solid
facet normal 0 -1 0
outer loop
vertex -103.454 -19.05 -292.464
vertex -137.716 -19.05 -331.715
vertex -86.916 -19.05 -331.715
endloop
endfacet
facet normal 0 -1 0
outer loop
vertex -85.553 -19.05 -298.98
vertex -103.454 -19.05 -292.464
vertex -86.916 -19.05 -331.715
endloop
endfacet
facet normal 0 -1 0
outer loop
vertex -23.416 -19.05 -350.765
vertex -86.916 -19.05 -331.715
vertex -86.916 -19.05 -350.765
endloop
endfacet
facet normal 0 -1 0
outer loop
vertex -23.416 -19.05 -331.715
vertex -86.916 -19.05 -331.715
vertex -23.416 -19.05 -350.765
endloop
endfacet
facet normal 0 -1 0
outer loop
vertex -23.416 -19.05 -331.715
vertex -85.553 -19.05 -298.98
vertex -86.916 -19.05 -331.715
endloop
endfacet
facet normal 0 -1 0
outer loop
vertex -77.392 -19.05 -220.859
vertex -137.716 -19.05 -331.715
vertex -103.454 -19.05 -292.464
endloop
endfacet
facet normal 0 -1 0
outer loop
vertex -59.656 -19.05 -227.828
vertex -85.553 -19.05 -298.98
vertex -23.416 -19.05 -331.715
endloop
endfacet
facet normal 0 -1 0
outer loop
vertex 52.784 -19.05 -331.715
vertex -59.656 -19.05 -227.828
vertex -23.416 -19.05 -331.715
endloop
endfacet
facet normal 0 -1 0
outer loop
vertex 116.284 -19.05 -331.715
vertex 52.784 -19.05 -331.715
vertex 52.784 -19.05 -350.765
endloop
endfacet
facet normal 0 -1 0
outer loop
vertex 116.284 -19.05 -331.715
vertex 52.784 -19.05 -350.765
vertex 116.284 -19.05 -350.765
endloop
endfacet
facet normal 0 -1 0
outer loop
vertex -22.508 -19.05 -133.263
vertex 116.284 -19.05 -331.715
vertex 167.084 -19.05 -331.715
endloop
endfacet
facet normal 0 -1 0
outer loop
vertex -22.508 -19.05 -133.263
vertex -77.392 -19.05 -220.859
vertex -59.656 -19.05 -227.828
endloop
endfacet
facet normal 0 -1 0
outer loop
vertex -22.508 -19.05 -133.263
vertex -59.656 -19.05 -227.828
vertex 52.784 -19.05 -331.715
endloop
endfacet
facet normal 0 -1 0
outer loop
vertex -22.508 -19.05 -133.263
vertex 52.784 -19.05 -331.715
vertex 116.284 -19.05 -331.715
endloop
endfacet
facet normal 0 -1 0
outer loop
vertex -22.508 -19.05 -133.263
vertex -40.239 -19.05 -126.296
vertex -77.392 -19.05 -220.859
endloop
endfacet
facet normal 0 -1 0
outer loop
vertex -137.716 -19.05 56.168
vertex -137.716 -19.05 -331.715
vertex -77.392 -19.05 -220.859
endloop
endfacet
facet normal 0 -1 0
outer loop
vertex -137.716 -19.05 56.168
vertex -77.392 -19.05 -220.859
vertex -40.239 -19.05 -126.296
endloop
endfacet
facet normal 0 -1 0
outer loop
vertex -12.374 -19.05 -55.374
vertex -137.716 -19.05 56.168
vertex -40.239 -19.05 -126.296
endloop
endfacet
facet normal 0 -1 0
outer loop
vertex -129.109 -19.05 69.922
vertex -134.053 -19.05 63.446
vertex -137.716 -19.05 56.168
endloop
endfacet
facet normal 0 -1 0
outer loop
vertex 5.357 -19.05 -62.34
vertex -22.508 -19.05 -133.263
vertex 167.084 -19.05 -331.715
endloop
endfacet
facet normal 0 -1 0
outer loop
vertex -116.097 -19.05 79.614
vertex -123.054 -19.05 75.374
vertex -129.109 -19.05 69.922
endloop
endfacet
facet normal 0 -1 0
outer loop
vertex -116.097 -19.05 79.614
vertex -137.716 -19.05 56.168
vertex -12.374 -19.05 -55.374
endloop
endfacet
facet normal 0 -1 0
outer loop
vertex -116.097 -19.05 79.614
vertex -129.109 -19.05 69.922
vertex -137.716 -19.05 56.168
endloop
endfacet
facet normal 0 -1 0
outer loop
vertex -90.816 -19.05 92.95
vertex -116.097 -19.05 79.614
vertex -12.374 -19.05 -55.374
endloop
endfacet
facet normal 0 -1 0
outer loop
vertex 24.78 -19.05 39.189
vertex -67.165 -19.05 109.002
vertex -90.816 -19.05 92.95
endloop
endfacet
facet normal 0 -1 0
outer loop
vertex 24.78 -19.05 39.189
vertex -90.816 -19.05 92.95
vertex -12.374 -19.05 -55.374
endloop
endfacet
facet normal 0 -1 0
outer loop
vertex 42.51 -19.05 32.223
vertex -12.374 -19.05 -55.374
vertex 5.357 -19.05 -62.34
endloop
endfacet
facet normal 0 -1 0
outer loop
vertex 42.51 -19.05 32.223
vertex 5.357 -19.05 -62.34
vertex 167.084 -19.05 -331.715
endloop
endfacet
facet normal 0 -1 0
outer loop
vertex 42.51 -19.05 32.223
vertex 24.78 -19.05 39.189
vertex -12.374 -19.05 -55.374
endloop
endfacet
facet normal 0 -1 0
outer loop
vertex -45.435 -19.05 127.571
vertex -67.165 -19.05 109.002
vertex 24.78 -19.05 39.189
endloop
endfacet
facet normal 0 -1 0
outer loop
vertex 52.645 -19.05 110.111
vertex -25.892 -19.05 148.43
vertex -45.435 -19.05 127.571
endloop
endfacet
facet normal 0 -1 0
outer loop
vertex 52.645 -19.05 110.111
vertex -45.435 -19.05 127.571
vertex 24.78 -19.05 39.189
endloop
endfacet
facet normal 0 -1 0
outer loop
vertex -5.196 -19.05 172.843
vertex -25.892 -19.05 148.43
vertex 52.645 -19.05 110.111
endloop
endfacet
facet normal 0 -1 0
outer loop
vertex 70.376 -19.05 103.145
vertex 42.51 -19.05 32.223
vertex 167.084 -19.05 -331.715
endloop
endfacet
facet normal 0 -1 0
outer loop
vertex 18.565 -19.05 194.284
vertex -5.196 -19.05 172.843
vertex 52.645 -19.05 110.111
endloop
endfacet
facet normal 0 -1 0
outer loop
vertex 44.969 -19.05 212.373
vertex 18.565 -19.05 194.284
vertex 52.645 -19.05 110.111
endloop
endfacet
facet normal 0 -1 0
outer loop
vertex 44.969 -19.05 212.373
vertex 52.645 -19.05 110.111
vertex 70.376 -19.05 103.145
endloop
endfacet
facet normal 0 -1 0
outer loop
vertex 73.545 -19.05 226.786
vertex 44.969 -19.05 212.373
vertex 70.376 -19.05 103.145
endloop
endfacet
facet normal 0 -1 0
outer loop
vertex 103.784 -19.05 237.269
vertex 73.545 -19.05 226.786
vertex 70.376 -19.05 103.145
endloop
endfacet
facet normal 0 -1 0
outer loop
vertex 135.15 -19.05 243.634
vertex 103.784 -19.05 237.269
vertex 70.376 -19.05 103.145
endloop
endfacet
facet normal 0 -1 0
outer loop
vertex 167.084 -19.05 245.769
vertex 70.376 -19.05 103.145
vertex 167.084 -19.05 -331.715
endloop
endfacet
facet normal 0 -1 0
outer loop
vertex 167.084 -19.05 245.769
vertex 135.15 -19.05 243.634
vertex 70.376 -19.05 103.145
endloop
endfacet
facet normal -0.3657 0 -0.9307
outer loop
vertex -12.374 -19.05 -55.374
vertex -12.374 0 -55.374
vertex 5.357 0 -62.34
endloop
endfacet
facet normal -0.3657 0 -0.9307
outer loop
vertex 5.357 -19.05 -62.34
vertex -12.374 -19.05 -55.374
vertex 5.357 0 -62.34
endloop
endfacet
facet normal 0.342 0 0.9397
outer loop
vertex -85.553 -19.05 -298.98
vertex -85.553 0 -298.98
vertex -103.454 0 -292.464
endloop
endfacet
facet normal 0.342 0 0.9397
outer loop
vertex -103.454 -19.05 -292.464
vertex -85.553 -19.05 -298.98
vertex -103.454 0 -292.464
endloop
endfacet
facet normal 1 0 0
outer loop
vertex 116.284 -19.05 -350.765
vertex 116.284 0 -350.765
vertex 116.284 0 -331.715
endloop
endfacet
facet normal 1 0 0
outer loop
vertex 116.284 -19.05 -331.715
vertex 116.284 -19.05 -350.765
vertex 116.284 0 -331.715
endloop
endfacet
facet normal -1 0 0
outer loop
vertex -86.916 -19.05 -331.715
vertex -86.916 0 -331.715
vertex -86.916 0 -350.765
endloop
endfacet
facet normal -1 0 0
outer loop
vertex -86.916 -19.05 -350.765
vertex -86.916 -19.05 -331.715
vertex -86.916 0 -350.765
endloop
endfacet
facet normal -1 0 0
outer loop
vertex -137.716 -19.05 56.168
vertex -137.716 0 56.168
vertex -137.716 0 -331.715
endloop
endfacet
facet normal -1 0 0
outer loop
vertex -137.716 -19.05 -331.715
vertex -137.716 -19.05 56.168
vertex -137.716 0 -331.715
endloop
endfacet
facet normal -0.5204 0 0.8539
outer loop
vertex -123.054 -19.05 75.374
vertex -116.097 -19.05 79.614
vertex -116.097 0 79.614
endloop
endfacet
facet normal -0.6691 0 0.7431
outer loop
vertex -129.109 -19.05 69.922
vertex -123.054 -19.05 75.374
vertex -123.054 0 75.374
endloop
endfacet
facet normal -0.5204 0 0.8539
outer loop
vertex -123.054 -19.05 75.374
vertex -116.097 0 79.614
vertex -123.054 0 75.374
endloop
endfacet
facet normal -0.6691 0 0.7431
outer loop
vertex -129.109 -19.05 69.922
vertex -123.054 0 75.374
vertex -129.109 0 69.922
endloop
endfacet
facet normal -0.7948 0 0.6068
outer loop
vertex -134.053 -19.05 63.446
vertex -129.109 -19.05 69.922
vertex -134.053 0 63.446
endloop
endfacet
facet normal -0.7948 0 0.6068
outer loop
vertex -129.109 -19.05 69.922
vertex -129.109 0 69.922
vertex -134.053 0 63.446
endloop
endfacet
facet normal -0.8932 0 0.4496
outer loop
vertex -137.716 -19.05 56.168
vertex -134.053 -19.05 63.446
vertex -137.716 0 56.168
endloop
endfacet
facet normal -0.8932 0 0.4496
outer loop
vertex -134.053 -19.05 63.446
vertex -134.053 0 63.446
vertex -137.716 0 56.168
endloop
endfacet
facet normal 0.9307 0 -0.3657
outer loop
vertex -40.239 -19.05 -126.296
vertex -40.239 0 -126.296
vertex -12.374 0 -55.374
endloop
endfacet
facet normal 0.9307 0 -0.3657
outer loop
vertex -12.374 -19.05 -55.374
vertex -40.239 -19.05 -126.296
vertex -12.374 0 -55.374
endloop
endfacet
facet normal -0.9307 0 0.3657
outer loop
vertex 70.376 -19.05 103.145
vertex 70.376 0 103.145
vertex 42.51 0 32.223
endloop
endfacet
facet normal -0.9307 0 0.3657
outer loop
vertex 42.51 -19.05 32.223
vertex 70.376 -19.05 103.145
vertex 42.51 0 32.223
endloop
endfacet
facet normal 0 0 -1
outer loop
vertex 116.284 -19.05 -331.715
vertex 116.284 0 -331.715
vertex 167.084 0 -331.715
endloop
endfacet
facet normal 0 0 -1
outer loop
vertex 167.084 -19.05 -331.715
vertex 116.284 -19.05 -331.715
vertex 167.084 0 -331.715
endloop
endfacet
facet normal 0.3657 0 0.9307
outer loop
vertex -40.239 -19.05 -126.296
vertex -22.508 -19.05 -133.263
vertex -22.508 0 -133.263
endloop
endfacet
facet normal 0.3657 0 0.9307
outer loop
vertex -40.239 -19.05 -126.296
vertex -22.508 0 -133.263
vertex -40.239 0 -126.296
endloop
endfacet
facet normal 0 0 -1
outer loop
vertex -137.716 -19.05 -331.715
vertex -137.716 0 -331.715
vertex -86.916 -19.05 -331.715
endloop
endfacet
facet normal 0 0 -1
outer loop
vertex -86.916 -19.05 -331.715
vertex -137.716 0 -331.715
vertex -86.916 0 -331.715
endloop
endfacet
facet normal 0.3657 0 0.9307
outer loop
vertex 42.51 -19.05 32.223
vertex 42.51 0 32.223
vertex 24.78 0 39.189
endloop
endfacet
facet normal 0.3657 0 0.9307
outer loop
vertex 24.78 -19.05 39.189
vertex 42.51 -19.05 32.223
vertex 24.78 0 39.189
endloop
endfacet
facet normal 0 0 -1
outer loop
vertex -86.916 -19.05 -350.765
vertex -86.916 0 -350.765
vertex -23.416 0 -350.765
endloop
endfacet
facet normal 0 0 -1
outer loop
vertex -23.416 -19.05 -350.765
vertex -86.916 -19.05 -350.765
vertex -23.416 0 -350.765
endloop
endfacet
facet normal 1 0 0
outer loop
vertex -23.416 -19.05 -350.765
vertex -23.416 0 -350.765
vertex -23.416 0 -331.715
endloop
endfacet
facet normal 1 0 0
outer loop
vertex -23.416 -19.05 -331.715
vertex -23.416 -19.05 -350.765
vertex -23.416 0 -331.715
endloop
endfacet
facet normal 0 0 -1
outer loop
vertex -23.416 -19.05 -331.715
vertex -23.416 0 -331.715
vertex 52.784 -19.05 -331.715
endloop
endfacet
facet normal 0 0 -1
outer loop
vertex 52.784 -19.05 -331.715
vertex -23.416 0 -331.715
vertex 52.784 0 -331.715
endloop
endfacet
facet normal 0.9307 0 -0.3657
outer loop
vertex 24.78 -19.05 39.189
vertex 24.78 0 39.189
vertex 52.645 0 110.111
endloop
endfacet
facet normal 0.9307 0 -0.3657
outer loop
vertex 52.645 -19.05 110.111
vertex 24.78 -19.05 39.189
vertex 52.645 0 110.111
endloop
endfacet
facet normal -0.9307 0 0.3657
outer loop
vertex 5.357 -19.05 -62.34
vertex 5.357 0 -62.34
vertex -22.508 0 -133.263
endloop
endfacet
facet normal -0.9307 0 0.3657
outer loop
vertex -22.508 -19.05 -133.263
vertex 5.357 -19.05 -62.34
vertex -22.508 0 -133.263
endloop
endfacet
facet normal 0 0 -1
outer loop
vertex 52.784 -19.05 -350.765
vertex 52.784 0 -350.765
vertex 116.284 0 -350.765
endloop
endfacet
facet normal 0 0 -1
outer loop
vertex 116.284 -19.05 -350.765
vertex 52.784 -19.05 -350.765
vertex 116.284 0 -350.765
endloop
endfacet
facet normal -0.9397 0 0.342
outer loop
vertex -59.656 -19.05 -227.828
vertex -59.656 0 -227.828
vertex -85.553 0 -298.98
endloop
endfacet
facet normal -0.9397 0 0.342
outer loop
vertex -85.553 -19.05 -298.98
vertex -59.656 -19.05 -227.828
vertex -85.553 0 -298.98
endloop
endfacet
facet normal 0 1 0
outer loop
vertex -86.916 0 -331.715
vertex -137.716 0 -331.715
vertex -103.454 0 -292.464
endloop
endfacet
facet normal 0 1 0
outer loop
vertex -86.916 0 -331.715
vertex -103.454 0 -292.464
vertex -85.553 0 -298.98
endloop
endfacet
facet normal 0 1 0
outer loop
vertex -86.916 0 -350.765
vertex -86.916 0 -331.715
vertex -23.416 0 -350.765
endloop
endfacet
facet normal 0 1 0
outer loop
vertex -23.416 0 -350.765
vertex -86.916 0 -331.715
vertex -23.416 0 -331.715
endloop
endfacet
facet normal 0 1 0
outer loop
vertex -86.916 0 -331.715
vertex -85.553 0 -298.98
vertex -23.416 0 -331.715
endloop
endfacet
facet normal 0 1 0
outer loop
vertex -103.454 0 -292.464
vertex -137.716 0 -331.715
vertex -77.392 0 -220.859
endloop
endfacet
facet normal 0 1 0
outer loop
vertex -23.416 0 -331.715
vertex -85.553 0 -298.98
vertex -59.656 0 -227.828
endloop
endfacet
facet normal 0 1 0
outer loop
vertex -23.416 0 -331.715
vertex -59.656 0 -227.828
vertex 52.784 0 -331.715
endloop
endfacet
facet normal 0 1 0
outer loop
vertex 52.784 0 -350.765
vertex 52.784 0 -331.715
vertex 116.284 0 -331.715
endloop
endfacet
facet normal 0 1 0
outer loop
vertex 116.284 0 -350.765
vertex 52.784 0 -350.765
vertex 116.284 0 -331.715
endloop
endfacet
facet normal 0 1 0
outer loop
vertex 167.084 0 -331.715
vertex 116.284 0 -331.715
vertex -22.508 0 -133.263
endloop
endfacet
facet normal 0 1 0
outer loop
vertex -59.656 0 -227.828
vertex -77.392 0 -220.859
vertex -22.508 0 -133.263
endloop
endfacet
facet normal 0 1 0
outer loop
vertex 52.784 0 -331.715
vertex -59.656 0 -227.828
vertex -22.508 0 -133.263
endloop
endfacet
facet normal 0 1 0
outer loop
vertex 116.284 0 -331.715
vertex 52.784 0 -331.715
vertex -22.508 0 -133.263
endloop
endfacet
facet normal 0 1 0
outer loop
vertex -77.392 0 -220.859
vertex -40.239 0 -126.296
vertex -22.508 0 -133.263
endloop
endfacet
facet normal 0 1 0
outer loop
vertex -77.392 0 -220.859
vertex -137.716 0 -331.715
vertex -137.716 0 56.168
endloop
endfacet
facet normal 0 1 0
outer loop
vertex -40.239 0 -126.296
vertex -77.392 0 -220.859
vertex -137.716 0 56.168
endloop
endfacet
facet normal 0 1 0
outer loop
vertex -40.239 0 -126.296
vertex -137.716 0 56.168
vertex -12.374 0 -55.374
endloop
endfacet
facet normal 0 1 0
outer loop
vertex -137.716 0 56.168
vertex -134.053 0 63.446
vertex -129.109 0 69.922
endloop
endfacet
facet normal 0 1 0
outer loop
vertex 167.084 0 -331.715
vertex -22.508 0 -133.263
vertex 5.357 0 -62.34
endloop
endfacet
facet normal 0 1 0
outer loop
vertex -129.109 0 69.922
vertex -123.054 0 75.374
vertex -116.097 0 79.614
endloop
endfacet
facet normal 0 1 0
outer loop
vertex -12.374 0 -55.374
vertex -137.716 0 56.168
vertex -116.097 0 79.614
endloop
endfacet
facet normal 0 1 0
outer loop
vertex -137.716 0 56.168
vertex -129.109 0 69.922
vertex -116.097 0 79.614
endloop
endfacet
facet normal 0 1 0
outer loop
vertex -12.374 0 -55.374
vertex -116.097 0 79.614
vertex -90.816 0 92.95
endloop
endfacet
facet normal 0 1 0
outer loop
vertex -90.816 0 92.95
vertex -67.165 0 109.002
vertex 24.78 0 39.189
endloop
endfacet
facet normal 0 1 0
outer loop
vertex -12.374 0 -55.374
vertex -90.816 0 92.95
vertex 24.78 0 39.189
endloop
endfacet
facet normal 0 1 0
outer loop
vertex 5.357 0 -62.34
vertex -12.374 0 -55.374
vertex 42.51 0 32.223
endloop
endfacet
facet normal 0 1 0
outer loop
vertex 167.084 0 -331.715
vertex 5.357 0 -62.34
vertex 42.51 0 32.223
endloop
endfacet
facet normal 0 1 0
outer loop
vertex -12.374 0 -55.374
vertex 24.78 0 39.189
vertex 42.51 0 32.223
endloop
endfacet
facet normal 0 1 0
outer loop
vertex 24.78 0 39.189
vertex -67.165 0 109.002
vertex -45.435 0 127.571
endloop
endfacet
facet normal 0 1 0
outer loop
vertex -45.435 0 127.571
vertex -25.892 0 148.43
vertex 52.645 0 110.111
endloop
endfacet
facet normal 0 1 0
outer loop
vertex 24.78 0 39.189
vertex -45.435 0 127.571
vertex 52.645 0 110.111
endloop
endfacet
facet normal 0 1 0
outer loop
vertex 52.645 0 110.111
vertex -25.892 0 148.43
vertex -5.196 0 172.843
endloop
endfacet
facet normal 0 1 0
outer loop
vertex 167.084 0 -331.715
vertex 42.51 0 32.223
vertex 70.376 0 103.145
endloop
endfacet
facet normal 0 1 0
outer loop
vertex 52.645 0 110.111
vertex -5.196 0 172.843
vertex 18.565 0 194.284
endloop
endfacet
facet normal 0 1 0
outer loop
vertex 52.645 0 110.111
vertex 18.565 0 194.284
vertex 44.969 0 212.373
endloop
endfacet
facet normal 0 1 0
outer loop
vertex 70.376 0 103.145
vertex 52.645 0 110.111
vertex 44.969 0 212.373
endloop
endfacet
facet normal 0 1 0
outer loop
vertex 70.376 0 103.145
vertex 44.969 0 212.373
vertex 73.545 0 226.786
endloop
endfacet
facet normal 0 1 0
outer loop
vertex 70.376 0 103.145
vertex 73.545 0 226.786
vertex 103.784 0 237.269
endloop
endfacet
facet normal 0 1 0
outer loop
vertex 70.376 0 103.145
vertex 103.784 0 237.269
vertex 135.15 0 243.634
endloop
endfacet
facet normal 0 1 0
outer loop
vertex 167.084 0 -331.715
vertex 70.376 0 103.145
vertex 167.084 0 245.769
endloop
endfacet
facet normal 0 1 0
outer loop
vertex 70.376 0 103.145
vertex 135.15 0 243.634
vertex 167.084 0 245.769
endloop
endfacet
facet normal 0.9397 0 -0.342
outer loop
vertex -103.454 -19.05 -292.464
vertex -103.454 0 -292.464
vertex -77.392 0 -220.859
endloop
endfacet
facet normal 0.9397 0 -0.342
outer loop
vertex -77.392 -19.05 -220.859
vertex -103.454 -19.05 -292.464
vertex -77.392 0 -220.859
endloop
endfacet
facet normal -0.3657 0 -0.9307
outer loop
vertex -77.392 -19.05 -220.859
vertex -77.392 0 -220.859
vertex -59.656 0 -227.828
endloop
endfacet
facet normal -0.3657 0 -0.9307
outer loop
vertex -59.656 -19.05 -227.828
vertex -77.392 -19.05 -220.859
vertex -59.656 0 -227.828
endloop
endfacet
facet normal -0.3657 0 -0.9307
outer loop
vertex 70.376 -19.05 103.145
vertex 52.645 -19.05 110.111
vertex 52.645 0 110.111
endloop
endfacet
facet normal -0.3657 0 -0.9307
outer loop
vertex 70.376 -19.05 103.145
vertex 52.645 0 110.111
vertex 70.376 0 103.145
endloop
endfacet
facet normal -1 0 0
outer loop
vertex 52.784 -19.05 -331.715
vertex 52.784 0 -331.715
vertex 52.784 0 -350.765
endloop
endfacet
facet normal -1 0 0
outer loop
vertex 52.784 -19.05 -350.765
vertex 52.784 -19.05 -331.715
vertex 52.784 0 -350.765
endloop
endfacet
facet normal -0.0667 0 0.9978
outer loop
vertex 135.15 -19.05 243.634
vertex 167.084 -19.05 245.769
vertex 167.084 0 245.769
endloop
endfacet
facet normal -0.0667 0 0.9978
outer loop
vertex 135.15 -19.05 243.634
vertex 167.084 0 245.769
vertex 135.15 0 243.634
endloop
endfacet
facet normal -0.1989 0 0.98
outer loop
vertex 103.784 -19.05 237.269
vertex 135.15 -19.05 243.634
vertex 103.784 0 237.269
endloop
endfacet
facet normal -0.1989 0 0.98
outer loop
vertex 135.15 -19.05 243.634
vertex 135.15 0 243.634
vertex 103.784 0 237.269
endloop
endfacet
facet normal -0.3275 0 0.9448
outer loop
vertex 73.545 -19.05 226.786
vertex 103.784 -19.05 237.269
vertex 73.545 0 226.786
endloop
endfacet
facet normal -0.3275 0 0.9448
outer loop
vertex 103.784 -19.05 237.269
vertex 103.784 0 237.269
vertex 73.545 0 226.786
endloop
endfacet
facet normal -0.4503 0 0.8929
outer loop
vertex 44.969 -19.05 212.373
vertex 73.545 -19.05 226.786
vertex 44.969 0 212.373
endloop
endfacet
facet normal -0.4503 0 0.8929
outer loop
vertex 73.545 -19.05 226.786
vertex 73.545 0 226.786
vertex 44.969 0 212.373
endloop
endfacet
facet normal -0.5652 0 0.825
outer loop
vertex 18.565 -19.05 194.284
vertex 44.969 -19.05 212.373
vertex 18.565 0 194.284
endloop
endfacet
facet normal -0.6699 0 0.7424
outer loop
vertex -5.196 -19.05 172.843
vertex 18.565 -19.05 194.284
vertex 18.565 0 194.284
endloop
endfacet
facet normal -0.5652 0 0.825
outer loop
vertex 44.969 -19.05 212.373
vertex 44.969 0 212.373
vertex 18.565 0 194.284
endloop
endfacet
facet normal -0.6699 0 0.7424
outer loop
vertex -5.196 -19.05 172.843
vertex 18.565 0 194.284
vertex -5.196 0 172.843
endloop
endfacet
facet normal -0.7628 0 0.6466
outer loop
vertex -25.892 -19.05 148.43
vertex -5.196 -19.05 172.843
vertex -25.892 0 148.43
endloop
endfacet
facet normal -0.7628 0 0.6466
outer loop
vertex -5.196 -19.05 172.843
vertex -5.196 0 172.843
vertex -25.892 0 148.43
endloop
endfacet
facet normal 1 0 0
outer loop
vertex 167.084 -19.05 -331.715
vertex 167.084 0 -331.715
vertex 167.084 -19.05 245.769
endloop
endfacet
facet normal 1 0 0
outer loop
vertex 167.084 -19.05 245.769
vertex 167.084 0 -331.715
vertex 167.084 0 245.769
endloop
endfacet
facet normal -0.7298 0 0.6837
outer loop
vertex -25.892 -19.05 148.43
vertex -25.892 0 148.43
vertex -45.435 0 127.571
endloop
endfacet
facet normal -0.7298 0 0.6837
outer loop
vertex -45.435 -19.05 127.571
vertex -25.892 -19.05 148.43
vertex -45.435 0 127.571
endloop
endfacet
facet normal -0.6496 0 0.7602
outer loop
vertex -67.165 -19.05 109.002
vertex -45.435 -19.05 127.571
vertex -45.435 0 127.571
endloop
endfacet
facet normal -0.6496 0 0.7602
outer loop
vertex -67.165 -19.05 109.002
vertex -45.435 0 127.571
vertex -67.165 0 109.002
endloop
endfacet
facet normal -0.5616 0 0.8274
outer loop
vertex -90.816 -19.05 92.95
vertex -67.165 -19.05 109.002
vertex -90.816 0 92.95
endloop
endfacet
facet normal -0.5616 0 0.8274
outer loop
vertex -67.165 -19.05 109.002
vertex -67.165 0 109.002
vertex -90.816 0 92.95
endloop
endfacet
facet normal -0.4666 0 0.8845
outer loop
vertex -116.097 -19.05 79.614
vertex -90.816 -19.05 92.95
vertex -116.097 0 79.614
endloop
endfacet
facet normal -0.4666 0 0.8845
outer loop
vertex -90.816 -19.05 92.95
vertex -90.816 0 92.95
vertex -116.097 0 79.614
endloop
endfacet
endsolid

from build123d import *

# Parameters (mm, degrees)
F1_DEPTH = 19.05


with BuildPart() as f1:
    # F0 (on Front) → F1 (new body)
    with BuildSketch(Plane.XZ):
        with BuildLine():
            Line((-137.715965, -183.12481), (-137.715965, -331.7148))
            Line((-137.715965, -331.7148), (-86.915965, -331.7148))
            Line((-86.915965, -331.7148), (-86.915965, -350.7648))
            Line((-86.915965, -350.7648), (-23.415965, -350.7648))
            Line((-23.415965, -350.7648), (-23.415965, -331.7148))
            Line((-23.415965, -331.7148), (52.784035, -331.7148))
            Line((52.784035, -331.7148), (52.784035, -350.7648))
            Line((52.784035, -350.7648), (116.284035, -350.7648))
            Line((116.284035, -350.7648), (116.284035, -331.7148))
            Line((116.284035, -331.7148), (167.084035, -331.7148))
            Line((167.084035, -331.7148), (167.084035, 245.768648))
            ThreePointArc((167.084035, 245.768648), (59.016129, 220.056395), (-25.892278, 148.4299))
            ThreePointArc((-25.892278, 148.4299), (-67.164643, 109.001513), (-116.097022, 79.613962))
            ThreePointArc((-116.097022, 79.613962), (-129.108758, 69.921843), (-137.715965, 56.168355))
            Line((-137.715965, 56.168355), (-137.715965, -183.12481))
        make_face()
        Polygon((-85.55314, -298.979528), (-103.454284, -292.464044), (-77.392349, -220.859466), (-59.656096, -227.827985), align=None, mode=Mode.SUBTRACT)
        Polygon((-22.508237, -133.262681), (-40.238813, -126.296393), (-12.373661, -55.374088), (5.356915, -62.340376), align=None, mode=Mode.SUBTRACT)
        Polygon((42.510451, 32.222697), (24.779875, 39.188985), (52.645027, 110.111289), (70.375603, 103.145001), align=None, mode=Mode.SUBTRACT)
    extrude(amount=F1_DEPTH)


solid = f1.part
